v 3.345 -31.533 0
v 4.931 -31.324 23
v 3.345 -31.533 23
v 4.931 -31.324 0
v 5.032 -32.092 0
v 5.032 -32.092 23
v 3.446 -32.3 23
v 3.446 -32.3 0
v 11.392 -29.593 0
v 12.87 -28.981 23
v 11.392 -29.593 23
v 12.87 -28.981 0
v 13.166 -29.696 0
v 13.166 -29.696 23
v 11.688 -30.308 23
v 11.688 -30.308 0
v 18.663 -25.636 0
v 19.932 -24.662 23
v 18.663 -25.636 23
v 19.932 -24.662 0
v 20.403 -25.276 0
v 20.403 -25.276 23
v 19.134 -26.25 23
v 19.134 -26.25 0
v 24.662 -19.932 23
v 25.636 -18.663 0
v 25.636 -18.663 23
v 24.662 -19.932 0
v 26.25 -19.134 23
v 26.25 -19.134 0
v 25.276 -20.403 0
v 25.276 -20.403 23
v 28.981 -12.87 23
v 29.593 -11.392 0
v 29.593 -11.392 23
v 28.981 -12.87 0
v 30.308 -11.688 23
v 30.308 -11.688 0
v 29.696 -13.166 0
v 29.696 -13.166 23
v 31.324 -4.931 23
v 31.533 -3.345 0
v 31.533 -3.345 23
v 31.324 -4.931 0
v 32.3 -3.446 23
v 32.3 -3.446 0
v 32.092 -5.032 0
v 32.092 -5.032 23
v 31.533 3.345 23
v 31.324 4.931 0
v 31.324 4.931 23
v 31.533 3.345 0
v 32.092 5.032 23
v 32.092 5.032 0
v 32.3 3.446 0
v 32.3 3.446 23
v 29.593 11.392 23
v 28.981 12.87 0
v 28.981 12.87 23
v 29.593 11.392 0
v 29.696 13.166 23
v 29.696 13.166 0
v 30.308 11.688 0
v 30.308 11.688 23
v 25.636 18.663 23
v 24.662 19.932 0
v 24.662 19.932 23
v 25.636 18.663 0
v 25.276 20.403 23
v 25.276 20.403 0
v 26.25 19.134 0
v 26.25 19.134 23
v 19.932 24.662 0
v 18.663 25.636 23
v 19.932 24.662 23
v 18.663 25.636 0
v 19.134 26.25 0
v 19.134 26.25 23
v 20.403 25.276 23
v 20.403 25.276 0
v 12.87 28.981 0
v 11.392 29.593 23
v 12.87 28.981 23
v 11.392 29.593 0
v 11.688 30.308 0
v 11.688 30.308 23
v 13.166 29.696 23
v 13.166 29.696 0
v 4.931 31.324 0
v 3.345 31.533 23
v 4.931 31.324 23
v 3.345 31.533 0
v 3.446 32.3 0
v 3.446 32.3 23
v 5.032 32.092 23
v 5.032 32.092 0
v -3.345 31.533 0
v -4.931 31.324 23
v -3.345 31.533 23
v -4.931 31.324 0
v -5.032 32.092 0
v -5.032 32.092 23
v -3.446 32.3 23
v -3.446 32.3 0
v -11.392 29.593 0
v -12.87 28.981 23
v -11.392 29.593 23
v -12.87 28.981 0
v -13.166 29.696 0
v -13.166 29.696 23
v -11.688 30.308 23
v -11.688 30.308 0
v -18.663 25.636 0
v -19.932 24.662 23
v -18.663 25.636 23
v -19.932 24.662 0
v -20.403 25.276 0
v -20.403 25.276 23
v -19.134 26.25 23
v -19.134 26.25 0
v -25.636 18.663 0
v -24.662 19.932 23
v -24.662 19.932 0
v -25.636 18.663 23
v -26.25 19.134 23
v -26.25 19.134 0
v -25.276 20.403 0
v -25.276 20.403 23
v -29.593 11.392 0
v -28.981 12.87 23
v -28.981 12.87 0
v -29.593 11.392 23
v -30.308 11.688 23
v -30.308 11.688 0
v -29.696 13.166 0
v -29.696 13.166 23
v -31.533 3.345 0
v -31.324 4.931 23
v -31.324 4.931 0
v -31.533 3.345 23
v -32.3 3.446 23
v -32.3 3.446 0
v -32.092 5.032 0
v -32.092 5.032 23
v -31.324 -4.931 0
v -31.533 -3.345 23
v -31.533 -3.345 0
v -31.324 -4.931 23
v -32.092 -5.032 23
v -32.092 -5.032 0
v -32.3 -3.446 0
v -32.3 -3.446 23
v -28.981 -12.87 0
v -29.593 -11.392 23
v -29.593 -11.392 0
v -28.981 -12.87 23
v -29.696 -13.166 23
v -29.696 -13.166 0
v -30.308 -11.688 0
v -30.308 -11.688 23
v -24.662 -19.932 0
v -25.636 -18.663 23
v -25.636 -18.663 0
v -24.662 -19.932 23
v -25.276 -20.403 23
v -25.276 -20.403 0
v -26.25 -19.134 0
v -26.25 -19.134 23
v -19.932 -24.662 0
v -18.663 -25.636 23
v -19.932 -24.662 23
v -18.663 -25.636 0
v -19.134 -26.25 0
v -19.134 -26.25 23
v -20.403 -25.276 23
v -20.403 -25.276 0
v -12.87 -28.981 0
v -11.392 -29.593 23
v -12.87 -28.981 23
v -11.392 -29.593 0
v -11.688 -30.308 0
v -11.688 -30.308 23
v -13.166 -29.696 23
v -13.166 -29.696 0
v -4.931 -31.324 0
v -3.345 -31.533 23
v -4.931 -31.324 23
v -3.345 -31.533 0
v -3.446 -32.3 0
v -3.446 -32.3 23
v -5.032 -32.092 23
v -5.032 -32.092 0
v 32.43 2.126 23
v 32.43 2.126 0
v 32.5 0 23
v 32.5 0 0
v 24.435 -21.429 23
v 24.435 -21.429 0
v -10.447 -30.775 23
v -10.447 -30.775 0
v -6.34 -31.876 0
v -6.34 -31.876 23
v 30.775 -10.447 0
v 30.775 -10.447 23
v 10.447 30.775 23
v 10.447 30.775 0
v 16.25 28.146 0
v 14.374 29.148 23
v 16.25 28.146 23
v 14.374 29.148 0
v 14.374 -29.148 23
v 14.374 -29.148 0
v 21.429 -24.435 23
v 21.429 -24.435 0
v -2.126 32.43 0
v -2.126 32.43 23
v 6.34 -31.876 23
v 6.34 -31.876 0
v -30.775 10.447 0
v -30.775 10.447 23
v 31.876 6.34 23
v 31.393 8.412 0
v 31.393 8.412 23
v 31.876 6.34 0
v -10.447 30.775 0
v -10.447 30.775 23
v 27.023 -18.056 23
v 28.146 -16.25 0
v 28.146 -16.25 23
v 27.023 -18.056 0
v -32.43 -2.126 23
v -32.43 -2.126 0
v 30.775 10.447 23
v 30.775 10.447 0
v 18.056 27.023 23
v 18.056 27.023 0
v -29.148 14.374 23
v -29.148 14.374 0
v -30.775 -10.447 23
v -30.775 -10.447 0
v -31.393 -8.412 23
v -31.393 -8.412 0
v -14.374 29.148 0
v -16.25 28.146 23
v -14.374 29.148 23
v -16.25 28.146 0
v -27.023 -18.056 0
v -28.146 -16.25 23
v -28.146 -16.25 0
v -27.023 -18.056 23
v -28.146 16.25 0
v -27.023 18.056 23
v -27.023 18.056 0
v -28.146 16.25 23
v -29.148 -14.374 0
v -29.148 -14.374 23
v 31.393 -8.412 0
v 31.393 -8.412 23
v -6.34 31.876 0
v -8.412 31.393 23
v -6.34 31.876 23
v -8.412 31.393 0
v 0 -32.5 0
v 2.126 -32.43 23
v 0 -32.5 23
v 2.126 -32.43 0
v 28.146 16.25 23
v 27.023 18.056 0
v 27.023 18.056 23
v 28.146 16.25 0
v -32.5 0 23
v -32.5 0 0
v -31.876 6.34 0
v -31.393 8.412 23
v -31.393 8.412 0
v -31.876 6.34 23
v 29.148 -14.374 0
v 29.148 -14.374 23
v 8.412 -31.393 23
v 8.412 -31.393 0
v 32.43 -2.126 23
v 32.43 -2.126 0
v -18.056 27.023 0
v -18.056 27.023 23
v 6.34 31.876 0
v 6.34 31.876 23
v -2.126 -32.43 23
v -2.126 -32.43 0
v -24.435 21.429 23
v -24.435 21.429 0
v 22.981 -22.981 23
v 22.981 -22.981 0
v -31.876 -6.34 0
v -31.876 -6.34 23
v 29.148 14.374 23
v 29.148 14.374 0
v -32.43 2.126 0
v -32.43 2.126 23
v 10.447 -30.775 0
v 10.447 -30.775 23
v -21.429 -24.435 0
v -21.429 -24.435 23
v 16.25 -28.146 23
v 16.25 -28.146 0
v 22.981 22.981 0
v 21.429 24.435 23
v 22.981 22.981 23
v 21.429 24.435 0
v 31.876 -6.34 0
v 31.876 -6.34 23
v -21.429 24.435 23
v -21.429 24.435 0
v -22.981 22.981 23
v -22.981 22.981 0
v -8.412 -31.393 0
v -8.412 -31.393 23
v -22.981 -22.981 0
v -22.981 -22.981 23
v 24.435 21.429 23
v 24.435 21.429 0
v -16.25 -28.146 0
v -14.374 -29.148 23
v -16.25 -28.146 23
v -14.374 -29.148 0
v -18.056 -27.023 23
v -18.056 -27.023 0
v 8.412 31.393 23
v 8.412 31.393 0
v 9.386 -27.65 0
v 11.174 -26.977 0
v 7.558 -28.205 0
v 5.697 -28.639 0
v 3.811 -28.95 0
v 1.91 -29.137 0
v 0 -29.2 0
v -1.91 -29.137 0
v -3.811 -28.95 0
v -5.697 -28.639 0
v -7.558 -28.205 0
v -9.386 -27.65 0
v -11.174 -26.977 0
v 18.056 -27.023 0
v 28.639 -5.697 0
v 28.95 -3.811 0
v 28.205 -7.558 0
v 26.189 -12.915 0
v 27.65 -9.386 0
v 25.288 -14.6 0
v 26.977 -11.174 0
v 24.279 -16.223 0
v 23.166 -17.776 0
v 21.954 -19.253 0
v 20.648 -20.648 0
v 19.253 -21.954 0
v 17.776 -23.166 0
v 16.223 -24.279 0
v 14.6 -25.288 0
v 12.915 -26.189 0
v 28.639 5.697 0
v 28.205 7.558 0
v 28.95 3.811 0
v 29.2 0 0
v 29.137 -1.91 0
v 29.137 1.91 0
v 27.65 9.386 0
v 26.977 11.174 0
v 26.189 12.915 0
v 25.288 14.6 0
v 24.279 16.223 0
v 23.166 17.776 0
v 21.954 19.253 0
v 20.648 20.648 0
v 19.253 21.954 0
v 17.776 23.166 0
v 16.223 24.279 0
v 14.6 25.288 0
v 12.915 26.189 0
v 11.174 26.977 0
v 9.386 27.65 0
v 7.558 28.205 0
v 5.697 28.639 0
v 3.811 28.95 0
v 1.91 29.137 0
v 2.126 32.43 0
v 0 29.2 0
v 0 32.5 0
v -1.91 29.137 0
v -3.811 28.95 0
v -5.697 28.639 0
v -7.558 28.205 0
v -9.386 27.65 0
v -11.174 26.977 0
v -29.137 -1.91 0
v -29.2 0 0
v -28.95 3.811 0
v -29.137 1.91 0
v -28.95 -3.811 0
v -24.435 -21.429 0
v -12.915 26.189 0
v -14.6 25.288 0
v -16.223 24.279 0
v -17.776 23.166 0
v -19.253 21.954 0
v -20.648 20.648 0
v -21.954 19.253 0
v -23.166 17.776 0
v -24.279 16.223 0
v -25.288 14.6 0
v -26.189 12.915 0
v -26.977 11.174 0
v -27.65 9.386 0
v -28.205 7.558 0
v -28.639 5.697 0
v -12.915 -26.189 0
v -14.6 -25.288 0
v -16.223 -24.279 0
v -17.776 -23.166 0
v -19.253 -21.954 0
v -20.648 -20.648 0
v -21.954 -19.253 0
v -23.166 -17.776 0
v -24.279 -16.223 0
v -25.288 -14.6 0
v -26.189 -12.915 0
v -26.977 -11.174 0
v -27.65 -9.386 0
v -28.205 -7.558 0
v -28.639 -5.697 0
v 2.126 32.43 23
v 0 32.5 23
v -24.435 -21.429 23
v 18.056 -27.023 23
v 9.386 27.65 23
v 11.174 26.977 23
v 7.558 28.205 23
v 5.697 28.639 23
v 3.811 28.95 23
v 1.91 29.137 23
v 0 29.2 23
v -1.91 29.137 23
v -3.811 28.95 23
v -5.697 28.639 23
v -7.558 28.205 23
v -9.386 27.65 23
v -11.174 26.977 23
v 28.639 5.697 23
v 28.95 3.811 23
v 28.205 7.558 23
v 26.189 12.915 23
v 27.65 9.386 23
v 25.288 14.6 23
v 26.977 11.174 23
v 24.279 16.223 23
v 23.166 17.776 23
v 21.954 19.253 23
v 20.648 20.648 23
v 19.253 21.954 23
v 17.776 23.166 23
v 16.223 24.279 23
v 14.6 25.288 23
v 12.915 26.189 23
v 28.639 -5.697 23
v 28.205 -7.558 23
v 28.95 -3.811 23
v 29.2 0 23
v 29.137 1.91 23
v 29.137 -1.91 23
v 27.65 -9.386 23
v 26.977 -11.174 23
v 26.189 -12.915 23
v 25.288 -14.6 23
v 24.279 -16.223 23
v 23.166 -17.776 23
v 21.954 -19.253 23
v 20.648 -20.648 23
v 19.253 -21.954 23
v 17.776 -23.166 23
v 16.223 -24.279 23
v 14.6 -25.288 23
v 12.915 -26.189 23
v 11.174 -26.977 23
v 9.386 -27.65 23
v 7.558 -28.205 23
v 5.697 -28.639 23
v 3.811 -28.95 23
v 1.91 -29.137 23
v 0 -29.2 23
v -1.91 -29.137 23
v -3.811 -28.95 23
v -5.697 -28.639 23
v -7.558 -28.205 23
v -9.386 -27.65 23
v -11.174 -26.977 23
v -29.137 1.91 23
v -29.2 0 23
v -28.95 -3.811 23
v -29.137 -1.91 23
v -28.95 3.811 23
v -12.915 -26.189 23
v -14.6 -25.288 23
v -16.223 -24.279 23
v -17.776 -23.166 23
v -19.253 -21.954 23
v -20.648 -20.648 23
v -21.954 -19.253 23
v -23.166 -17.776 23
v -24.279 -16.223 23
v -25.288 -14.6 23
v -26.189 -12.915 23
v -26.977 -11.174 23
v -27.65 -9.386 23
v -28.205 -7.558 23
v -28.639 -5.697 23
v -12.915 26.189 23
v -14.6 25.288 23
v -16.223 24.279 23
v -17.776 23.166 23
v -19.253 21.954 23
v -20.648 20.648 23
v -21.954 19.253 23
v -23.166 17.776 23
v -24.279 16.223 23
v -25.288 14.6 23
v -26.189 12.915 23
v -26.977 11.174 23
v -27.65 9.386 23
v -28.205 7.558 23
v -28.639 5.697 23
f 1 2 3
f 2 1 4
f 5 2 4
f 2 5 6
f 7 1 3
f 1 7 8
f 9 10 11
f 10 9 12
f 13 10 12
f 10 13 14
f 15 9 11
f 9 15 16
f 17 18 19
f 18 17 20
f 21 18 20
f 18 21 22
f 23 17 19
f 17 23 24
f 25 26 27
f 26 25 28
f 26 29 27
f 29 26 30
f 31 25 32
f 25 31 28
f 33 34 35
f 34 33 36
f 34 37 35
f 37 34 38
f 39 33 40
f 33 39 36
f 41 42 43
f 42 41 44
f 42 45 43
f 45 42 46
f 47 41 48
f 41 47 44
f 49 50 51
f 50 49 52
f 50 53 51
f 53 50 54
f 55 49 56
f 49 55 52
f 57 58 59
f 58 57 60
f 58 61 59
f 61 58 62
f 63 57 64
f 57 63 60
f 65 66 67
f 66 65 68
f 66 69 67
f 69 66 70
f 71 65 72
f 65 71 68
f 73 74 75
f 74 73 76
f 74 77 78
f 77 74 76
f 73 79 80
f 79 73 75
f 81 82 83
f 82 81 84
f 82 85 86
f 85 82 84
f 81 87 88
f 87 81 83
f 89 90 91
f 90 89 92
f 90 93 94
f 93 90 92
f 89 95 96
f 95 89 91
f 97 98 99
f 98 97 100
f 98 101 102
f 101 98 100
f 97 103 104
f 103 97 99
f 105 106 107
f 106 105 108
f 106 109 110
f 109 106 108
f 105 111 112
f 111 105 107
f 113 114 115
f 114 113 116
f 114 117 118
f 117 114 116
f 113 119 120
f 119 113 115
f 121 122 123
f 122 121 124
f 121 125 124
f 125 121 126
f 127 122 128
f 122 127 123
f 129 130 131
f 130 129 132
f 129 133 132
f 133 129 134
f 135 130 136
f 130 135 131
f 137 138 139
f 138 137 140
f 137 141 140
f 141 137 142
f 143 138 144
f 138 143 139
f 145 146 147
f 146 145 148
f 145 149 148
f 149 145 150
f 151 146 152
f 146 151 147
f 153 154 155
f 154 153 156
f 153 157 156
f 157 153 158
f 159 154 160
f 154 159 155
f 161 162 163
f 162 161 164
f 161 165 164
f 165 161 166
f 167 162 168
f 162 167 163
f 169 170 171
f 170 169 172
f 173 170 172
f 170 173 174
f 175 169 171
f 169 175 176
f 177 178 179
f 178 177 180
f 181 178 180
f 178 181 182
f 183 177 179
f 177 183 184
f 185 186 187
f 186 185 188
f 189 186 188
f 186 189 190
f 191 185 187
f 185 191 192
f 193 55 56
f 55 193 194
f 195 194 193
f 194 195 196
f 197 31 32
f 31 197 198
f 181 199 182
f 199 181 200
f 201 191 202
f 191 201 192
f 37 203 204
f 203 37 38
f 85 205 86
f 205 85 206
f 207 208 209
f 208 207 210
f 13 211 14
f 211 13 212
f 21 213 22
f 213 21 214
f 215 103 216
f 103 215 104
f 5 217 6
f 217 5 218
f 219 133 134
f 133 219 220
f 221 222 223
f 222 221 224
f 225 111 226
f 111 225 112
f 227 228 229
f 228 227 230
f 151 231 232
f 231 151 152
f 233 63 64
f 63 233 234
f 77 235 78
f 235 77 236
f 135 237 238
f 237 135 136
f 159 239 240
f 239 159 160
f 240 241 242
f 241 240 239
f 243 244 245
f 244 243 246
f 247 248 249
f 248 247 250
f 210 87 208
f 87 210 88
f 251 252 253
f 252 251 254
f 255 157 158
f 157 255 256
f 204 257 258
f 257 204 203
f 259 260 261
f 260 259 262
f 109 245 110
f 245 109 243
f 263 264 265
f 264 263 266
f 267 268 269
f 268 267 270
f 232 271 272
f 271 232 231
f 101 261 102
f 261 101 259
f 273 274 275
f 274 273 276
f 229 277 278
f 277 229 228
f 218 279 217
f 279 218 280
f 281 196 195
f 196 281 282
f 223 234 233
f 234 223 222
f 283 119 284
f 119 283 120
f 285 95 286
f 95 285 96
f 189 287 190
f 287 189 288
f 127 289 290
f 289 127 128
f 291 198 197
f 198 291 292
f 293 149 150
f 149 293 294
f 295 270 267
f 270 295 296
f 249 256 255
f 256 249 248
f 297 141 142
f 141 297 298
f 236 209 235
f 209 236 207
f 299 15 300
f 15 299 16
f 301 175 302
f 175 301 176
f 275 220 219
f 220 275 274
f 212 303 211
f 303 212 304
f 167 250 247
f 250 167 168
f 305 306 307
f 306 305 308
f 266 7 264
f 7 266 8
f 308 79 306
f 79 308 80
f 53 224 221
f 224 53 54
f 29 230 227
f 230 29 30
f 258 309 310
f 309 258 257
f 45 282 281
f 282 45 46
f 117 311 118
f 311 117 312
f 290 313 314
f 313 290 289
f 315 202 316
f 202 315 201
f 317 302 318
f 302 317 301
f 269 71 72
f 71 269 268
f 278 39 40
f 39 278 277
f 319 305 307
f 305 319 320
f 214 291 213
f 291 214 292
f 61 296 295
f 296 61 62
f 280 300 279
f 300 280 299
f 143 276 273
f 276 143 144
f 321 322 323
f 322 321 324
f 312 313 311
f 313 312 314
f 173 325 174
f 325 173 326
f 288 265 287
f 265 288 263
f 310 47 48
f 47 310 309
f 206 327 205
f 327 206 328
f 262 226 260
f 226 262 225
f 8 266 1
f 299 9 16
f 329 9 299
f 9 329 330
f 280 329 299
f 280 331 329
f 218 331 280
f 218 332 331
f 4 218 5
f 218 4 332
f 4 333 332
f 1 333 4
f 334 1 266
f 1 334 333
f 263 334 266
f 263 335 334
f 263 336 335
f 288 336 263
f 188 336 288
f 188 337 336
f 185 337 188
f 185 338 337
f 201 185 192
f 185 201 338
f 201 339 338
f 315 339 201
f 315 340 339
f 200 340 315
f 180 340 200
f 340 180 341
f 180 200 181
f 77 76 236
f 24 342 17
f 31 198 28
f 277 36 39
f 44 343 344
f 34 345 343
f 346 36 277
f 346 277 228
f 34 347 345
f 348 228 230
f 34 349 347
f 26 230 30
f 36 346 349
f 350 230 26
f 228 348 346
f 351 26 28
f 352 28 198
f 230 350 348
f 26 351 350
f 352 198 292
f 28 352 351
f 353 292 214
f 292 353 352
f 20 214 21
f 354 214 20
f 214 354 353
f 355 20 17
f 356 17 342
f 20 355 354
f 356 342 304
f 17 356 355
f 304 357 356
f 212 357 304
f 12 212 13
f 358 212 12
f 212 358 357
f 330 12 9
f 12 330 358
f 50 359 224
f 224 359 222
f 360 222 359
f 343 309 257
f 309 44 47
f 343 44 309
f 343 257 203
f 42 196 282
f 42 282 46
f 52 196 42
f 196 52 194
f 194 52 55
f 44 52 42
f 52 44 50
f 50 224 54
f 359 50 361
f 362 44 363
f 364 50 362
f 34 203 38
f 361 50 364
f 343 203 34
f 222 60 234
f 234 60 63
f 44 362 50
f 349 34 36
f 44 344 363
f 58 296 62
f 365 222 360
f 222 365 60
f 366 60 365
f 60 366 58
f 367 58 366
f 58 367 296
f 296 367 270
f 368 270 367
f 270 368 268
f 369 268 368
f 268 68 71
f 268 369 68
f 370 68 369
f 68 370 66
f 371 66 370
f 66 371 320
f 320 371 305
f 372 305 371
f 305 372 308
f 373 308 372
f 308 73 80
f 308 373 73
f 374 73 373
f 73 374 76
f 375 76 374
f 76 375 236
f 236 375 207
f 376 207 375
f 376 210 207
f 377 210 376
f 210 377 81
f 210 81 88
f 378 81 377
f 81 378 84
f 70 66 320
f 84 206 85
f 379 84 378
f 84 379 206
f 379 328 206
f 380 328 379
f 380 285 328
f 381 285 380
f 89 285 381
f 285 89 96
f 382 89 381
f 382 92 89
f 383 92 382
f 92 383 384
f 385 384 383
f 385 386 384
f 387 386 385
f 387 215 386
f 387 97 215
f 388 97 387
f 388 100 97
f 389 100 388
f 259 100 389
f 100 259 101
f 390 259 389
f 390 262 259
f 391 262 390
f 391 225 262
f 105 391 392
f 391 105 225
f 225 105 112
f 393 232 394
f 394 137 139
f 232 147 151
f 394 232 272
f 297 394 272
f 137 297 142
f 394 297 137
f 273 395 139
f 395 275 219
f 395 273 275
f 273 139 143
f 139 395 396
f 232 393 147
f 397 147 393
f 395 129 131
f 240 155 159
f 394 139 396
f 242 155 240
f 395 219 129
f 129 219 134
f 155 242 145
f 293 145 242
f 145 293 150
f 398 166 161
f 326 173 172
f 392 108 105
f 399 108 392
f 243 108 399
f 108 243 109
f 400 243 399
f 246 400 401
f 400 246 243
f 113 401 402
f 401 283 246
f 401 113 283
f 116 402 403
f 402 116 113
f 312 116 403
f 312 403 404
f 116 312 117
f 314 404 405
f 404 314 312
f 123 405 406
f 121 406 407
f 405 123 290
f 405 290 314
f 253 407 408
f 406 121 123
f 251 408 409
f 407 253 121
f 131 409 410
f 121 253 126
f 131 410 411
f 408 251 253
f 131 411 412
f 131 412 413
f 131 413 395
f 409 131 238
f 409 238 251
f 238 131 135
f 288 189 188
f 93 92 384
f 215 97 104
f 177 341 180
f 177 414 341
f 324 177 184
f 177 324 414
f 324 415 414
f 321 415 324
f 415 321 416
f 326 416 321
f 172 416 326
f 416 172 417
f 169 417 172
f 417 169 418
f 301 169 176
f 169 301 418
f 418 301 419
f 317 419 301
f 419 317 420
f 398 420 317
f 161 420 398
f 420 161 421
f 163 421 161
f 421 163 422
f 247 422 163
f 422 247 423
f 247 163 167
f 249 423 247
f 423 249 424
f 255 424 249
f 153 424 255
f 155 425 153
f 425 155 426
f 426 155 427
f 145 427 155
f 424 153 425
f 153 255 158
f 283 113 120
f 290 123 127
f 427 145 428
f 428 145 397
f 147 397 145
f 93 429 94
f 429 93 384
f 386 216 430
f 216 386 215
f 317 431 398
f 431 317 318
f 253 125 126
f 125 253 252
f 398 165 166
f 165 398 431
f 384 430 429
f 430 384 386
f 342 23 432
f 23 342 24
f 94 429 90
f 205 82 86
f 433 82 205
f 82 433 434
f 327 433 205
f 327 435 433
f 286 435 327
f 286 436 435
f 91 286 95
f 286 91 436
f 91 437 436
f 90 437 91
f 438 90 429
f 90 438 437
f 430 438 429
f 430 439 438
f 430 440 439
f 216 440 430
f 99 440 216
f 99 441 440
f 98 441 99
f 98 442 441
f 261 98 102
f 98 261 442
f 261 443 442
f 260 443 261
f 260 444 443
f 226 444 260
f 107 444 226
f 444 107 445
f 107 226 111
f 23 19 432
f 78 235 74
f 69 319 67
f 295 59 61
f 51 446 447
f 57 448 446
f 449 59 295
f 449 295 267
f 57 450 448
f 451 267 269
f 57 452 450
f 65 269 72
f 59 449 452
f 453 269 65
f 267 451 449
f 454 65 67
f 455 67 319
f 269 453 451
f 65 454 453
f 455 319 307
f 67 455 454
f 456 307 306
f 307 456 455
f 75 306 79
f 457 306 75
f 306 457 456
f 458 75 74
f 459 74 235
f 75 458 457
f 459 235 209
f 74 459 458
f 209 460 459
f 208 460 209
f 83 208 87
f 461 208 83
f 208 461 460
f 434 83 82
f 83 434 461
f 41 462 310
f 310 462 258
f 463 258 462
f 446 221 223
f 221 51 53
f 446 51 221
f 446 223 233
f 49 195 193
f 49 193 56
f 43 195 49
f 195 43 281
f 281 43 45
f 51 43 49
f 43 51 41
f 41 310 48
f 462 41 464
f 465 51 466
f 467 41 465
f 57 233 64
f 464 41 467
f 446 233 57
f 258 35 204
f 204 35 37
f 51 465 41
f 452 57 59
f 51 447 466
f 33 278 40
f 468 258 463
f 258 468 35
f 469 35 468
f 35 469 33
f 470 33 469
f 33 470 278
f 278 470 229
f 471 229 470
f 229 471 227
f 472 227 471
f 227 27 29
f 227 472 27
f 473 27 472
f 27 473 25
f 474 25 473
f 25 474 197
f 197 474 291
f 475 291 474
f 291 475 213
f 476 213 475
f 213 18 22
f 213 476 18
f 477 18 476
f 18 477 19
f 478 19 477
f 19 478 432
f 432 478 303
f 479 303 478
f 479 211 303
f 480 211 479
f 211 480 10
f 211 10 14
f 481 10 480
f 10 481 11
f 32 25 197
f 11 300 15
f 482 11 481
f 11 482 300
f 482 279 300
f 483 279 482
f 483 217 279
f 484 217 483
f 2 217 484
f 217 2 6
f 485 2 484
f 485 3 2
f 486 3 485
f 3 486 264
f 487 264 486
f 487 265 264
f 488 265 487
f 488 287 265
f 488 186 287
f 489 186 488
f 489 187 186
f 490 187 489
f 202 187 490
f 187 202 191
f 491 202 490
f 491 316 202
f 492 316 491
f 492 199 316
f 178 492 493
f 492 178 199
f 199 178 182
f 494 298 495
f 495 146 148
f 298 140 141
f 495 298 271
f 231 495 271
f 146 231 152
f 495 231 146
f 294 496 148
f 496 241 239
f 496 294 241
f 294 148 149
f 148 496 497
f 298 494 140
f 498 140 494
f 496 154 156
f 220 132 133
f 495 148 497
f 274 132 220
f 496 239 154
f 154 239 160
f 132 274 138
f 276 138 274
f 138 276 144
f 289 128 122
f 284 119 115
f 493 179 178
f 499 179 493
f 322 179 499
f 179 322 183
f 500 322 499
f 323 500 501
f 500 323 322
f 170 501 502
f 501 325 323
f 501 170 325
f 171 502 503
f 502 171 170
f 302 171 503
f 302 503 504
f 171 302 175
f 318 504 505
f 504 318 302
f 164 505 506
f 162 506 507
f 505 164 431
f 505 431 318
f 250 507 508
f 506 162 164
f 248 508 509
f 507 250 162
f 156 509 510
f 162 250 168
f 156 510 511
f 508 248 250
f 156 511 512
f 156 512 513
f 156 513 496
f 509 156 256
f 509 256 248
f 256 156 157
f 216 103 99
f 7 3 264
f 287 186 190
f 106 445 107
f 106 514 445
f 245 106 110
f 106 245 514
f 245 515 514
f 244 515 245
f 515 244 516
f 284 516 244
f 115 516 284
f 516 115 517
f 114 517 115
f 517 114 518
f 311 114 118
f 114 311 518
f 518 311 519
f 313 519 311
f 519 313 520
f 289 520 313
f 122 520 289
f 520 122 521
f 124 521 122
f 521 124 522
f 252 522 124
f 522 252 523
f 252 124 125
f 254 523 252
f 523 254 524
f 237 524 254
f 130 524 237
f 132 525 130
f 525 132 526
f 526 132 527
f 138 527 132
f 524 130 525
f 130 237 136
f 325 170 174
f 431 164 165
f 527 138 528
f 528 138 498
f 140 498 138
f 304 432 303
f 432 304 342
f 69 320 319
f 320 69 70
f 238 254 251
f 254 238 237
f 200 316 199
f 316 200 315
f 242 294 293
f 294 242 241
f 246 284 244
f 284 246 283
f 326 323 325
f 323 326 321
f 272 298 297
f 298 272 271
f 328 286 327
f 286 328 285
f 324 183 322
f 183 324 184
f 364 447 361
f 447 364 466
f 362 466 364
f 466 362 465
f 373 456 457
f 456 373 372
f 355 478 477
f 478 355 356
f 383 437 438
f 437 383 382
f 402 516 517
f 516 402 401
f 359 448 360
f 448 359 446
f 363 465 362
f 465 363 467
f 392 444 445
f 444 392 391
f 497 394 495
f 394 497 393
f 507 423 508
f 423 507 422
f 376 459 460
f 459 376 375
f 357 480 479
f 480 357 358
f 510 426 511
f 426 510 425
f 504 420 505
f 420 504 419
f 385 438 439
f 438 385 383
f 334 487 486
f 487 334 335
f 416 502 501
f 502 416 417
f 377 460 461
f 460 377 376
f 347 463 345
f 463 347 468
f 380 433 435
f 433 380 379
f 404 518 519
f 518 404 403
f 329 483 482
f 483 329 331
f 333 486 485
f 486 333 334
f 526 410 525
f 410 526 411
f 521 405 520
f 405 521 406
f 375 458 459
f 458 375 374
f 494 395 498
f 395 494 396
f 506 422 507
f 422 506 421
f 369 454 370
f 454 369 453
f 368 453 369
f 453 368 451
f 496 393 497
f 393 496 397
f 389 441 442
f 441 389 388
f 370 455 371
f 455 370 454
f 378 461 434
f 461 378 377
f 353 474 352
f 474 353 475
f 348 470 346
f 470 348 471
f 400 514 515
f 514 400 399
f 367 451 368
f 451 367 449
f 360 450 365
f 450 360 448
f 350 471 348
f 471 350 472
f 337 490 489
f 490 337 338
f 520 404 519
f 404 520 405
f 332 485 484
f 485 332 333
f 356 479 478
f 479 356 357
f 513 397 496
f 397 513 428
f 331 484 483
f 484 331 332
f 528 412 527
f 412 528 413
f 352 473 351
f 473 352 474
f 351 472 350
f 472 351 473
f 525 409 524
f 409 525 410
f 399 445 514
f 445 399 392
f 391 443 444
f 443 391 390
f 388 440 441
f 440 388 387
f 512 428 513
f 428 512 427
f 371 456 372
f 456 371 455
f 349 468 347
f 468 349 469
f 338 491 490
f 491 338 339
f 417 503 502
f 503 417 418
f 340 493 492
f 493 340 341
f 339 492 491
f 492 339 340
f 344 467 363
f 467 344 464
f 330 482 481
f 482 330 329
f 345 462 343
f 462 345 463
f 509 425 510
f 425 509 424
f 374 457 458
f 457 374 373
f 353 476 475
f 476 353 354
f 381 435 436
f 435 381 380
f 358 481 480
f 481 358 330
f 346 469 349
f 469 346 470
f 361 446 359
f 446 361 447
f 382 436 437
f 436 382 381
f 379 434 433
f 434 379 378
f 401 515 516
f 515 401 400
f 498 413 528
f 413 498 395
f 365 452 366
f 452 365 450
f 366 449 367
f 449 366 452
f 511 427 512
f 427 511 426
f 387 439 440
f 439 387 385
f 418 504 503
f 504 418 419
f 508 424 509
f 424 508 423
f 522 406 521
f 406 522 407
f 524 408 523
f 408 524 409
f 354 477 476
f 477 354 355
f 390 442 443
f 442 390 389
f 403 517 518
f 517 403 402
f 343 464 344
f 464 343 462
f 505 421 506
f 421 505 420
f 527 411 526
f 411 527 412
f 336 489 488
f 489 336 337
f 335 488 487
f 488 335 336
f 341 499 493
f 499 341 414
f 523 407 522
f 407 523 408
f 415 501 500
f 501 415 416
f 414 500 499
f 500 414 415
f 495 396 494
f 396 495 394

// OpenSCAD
// =====================================================================
//  robot base :: tire (print 2, TPU 95A)
//  Ring ID 58.4 (stretches onto the 59 hub body and over the 62 flanges), OD 65,
//  23 wide = hub groove between the flanges, 24 light transverse tread grooves
//  (0.8 deep). The bottom of the tire (z 0) is a tread land.
//  Print orientation: flat on the bed (ring), no supports; slow, no retraction-heavy.
//  robot_tire(side)  side +1 / -1, robot frame.
// =====================================================================
include <../lib/params.scad>
include <../lib/robot_params.scad>

rbt_id = 58.4;  rbt_w = rb_wheel_w - 3;  rbt_groove = [1.6, 0.8];  rbt_n = 24;

module robot_tire_local() {   // axis = Z, z 0 .. rbt_w
    difference() {
        cylinder(h = rbt_w, d = rb_wheel_d, $fn = 96);
        translate([0, 0, -1]) cylinder(h = rbt_w + 2, d = rbt_id, $fn = 96);
        // tread: groove centres a half pitch off the 270 deg land (the ground contact)
        for (k = [0 : rbt_n - 1]) rotate([0, 0, 270 + 360 / rbt_n * (k + 0.5)])
            translate([rb_wheel_d / 2 - rbt_groove[1], -rbt_groove[0] / 2, -1])
                cube([rbt_groove[1] + 1, rbt_groove[0], rbt_w + 2]);
    }
}

module robot_tire(side = 1) {
    translate([rb_axle_x, side * rb_wheel_y, rb_axle_z]) rotate([90, 0, 0])
        translate([0, 0, -rbt_w / 2]) robot_tire_local();
}

module robot_tire_print() { robot_tire_local(); }

robot_tire_print();
